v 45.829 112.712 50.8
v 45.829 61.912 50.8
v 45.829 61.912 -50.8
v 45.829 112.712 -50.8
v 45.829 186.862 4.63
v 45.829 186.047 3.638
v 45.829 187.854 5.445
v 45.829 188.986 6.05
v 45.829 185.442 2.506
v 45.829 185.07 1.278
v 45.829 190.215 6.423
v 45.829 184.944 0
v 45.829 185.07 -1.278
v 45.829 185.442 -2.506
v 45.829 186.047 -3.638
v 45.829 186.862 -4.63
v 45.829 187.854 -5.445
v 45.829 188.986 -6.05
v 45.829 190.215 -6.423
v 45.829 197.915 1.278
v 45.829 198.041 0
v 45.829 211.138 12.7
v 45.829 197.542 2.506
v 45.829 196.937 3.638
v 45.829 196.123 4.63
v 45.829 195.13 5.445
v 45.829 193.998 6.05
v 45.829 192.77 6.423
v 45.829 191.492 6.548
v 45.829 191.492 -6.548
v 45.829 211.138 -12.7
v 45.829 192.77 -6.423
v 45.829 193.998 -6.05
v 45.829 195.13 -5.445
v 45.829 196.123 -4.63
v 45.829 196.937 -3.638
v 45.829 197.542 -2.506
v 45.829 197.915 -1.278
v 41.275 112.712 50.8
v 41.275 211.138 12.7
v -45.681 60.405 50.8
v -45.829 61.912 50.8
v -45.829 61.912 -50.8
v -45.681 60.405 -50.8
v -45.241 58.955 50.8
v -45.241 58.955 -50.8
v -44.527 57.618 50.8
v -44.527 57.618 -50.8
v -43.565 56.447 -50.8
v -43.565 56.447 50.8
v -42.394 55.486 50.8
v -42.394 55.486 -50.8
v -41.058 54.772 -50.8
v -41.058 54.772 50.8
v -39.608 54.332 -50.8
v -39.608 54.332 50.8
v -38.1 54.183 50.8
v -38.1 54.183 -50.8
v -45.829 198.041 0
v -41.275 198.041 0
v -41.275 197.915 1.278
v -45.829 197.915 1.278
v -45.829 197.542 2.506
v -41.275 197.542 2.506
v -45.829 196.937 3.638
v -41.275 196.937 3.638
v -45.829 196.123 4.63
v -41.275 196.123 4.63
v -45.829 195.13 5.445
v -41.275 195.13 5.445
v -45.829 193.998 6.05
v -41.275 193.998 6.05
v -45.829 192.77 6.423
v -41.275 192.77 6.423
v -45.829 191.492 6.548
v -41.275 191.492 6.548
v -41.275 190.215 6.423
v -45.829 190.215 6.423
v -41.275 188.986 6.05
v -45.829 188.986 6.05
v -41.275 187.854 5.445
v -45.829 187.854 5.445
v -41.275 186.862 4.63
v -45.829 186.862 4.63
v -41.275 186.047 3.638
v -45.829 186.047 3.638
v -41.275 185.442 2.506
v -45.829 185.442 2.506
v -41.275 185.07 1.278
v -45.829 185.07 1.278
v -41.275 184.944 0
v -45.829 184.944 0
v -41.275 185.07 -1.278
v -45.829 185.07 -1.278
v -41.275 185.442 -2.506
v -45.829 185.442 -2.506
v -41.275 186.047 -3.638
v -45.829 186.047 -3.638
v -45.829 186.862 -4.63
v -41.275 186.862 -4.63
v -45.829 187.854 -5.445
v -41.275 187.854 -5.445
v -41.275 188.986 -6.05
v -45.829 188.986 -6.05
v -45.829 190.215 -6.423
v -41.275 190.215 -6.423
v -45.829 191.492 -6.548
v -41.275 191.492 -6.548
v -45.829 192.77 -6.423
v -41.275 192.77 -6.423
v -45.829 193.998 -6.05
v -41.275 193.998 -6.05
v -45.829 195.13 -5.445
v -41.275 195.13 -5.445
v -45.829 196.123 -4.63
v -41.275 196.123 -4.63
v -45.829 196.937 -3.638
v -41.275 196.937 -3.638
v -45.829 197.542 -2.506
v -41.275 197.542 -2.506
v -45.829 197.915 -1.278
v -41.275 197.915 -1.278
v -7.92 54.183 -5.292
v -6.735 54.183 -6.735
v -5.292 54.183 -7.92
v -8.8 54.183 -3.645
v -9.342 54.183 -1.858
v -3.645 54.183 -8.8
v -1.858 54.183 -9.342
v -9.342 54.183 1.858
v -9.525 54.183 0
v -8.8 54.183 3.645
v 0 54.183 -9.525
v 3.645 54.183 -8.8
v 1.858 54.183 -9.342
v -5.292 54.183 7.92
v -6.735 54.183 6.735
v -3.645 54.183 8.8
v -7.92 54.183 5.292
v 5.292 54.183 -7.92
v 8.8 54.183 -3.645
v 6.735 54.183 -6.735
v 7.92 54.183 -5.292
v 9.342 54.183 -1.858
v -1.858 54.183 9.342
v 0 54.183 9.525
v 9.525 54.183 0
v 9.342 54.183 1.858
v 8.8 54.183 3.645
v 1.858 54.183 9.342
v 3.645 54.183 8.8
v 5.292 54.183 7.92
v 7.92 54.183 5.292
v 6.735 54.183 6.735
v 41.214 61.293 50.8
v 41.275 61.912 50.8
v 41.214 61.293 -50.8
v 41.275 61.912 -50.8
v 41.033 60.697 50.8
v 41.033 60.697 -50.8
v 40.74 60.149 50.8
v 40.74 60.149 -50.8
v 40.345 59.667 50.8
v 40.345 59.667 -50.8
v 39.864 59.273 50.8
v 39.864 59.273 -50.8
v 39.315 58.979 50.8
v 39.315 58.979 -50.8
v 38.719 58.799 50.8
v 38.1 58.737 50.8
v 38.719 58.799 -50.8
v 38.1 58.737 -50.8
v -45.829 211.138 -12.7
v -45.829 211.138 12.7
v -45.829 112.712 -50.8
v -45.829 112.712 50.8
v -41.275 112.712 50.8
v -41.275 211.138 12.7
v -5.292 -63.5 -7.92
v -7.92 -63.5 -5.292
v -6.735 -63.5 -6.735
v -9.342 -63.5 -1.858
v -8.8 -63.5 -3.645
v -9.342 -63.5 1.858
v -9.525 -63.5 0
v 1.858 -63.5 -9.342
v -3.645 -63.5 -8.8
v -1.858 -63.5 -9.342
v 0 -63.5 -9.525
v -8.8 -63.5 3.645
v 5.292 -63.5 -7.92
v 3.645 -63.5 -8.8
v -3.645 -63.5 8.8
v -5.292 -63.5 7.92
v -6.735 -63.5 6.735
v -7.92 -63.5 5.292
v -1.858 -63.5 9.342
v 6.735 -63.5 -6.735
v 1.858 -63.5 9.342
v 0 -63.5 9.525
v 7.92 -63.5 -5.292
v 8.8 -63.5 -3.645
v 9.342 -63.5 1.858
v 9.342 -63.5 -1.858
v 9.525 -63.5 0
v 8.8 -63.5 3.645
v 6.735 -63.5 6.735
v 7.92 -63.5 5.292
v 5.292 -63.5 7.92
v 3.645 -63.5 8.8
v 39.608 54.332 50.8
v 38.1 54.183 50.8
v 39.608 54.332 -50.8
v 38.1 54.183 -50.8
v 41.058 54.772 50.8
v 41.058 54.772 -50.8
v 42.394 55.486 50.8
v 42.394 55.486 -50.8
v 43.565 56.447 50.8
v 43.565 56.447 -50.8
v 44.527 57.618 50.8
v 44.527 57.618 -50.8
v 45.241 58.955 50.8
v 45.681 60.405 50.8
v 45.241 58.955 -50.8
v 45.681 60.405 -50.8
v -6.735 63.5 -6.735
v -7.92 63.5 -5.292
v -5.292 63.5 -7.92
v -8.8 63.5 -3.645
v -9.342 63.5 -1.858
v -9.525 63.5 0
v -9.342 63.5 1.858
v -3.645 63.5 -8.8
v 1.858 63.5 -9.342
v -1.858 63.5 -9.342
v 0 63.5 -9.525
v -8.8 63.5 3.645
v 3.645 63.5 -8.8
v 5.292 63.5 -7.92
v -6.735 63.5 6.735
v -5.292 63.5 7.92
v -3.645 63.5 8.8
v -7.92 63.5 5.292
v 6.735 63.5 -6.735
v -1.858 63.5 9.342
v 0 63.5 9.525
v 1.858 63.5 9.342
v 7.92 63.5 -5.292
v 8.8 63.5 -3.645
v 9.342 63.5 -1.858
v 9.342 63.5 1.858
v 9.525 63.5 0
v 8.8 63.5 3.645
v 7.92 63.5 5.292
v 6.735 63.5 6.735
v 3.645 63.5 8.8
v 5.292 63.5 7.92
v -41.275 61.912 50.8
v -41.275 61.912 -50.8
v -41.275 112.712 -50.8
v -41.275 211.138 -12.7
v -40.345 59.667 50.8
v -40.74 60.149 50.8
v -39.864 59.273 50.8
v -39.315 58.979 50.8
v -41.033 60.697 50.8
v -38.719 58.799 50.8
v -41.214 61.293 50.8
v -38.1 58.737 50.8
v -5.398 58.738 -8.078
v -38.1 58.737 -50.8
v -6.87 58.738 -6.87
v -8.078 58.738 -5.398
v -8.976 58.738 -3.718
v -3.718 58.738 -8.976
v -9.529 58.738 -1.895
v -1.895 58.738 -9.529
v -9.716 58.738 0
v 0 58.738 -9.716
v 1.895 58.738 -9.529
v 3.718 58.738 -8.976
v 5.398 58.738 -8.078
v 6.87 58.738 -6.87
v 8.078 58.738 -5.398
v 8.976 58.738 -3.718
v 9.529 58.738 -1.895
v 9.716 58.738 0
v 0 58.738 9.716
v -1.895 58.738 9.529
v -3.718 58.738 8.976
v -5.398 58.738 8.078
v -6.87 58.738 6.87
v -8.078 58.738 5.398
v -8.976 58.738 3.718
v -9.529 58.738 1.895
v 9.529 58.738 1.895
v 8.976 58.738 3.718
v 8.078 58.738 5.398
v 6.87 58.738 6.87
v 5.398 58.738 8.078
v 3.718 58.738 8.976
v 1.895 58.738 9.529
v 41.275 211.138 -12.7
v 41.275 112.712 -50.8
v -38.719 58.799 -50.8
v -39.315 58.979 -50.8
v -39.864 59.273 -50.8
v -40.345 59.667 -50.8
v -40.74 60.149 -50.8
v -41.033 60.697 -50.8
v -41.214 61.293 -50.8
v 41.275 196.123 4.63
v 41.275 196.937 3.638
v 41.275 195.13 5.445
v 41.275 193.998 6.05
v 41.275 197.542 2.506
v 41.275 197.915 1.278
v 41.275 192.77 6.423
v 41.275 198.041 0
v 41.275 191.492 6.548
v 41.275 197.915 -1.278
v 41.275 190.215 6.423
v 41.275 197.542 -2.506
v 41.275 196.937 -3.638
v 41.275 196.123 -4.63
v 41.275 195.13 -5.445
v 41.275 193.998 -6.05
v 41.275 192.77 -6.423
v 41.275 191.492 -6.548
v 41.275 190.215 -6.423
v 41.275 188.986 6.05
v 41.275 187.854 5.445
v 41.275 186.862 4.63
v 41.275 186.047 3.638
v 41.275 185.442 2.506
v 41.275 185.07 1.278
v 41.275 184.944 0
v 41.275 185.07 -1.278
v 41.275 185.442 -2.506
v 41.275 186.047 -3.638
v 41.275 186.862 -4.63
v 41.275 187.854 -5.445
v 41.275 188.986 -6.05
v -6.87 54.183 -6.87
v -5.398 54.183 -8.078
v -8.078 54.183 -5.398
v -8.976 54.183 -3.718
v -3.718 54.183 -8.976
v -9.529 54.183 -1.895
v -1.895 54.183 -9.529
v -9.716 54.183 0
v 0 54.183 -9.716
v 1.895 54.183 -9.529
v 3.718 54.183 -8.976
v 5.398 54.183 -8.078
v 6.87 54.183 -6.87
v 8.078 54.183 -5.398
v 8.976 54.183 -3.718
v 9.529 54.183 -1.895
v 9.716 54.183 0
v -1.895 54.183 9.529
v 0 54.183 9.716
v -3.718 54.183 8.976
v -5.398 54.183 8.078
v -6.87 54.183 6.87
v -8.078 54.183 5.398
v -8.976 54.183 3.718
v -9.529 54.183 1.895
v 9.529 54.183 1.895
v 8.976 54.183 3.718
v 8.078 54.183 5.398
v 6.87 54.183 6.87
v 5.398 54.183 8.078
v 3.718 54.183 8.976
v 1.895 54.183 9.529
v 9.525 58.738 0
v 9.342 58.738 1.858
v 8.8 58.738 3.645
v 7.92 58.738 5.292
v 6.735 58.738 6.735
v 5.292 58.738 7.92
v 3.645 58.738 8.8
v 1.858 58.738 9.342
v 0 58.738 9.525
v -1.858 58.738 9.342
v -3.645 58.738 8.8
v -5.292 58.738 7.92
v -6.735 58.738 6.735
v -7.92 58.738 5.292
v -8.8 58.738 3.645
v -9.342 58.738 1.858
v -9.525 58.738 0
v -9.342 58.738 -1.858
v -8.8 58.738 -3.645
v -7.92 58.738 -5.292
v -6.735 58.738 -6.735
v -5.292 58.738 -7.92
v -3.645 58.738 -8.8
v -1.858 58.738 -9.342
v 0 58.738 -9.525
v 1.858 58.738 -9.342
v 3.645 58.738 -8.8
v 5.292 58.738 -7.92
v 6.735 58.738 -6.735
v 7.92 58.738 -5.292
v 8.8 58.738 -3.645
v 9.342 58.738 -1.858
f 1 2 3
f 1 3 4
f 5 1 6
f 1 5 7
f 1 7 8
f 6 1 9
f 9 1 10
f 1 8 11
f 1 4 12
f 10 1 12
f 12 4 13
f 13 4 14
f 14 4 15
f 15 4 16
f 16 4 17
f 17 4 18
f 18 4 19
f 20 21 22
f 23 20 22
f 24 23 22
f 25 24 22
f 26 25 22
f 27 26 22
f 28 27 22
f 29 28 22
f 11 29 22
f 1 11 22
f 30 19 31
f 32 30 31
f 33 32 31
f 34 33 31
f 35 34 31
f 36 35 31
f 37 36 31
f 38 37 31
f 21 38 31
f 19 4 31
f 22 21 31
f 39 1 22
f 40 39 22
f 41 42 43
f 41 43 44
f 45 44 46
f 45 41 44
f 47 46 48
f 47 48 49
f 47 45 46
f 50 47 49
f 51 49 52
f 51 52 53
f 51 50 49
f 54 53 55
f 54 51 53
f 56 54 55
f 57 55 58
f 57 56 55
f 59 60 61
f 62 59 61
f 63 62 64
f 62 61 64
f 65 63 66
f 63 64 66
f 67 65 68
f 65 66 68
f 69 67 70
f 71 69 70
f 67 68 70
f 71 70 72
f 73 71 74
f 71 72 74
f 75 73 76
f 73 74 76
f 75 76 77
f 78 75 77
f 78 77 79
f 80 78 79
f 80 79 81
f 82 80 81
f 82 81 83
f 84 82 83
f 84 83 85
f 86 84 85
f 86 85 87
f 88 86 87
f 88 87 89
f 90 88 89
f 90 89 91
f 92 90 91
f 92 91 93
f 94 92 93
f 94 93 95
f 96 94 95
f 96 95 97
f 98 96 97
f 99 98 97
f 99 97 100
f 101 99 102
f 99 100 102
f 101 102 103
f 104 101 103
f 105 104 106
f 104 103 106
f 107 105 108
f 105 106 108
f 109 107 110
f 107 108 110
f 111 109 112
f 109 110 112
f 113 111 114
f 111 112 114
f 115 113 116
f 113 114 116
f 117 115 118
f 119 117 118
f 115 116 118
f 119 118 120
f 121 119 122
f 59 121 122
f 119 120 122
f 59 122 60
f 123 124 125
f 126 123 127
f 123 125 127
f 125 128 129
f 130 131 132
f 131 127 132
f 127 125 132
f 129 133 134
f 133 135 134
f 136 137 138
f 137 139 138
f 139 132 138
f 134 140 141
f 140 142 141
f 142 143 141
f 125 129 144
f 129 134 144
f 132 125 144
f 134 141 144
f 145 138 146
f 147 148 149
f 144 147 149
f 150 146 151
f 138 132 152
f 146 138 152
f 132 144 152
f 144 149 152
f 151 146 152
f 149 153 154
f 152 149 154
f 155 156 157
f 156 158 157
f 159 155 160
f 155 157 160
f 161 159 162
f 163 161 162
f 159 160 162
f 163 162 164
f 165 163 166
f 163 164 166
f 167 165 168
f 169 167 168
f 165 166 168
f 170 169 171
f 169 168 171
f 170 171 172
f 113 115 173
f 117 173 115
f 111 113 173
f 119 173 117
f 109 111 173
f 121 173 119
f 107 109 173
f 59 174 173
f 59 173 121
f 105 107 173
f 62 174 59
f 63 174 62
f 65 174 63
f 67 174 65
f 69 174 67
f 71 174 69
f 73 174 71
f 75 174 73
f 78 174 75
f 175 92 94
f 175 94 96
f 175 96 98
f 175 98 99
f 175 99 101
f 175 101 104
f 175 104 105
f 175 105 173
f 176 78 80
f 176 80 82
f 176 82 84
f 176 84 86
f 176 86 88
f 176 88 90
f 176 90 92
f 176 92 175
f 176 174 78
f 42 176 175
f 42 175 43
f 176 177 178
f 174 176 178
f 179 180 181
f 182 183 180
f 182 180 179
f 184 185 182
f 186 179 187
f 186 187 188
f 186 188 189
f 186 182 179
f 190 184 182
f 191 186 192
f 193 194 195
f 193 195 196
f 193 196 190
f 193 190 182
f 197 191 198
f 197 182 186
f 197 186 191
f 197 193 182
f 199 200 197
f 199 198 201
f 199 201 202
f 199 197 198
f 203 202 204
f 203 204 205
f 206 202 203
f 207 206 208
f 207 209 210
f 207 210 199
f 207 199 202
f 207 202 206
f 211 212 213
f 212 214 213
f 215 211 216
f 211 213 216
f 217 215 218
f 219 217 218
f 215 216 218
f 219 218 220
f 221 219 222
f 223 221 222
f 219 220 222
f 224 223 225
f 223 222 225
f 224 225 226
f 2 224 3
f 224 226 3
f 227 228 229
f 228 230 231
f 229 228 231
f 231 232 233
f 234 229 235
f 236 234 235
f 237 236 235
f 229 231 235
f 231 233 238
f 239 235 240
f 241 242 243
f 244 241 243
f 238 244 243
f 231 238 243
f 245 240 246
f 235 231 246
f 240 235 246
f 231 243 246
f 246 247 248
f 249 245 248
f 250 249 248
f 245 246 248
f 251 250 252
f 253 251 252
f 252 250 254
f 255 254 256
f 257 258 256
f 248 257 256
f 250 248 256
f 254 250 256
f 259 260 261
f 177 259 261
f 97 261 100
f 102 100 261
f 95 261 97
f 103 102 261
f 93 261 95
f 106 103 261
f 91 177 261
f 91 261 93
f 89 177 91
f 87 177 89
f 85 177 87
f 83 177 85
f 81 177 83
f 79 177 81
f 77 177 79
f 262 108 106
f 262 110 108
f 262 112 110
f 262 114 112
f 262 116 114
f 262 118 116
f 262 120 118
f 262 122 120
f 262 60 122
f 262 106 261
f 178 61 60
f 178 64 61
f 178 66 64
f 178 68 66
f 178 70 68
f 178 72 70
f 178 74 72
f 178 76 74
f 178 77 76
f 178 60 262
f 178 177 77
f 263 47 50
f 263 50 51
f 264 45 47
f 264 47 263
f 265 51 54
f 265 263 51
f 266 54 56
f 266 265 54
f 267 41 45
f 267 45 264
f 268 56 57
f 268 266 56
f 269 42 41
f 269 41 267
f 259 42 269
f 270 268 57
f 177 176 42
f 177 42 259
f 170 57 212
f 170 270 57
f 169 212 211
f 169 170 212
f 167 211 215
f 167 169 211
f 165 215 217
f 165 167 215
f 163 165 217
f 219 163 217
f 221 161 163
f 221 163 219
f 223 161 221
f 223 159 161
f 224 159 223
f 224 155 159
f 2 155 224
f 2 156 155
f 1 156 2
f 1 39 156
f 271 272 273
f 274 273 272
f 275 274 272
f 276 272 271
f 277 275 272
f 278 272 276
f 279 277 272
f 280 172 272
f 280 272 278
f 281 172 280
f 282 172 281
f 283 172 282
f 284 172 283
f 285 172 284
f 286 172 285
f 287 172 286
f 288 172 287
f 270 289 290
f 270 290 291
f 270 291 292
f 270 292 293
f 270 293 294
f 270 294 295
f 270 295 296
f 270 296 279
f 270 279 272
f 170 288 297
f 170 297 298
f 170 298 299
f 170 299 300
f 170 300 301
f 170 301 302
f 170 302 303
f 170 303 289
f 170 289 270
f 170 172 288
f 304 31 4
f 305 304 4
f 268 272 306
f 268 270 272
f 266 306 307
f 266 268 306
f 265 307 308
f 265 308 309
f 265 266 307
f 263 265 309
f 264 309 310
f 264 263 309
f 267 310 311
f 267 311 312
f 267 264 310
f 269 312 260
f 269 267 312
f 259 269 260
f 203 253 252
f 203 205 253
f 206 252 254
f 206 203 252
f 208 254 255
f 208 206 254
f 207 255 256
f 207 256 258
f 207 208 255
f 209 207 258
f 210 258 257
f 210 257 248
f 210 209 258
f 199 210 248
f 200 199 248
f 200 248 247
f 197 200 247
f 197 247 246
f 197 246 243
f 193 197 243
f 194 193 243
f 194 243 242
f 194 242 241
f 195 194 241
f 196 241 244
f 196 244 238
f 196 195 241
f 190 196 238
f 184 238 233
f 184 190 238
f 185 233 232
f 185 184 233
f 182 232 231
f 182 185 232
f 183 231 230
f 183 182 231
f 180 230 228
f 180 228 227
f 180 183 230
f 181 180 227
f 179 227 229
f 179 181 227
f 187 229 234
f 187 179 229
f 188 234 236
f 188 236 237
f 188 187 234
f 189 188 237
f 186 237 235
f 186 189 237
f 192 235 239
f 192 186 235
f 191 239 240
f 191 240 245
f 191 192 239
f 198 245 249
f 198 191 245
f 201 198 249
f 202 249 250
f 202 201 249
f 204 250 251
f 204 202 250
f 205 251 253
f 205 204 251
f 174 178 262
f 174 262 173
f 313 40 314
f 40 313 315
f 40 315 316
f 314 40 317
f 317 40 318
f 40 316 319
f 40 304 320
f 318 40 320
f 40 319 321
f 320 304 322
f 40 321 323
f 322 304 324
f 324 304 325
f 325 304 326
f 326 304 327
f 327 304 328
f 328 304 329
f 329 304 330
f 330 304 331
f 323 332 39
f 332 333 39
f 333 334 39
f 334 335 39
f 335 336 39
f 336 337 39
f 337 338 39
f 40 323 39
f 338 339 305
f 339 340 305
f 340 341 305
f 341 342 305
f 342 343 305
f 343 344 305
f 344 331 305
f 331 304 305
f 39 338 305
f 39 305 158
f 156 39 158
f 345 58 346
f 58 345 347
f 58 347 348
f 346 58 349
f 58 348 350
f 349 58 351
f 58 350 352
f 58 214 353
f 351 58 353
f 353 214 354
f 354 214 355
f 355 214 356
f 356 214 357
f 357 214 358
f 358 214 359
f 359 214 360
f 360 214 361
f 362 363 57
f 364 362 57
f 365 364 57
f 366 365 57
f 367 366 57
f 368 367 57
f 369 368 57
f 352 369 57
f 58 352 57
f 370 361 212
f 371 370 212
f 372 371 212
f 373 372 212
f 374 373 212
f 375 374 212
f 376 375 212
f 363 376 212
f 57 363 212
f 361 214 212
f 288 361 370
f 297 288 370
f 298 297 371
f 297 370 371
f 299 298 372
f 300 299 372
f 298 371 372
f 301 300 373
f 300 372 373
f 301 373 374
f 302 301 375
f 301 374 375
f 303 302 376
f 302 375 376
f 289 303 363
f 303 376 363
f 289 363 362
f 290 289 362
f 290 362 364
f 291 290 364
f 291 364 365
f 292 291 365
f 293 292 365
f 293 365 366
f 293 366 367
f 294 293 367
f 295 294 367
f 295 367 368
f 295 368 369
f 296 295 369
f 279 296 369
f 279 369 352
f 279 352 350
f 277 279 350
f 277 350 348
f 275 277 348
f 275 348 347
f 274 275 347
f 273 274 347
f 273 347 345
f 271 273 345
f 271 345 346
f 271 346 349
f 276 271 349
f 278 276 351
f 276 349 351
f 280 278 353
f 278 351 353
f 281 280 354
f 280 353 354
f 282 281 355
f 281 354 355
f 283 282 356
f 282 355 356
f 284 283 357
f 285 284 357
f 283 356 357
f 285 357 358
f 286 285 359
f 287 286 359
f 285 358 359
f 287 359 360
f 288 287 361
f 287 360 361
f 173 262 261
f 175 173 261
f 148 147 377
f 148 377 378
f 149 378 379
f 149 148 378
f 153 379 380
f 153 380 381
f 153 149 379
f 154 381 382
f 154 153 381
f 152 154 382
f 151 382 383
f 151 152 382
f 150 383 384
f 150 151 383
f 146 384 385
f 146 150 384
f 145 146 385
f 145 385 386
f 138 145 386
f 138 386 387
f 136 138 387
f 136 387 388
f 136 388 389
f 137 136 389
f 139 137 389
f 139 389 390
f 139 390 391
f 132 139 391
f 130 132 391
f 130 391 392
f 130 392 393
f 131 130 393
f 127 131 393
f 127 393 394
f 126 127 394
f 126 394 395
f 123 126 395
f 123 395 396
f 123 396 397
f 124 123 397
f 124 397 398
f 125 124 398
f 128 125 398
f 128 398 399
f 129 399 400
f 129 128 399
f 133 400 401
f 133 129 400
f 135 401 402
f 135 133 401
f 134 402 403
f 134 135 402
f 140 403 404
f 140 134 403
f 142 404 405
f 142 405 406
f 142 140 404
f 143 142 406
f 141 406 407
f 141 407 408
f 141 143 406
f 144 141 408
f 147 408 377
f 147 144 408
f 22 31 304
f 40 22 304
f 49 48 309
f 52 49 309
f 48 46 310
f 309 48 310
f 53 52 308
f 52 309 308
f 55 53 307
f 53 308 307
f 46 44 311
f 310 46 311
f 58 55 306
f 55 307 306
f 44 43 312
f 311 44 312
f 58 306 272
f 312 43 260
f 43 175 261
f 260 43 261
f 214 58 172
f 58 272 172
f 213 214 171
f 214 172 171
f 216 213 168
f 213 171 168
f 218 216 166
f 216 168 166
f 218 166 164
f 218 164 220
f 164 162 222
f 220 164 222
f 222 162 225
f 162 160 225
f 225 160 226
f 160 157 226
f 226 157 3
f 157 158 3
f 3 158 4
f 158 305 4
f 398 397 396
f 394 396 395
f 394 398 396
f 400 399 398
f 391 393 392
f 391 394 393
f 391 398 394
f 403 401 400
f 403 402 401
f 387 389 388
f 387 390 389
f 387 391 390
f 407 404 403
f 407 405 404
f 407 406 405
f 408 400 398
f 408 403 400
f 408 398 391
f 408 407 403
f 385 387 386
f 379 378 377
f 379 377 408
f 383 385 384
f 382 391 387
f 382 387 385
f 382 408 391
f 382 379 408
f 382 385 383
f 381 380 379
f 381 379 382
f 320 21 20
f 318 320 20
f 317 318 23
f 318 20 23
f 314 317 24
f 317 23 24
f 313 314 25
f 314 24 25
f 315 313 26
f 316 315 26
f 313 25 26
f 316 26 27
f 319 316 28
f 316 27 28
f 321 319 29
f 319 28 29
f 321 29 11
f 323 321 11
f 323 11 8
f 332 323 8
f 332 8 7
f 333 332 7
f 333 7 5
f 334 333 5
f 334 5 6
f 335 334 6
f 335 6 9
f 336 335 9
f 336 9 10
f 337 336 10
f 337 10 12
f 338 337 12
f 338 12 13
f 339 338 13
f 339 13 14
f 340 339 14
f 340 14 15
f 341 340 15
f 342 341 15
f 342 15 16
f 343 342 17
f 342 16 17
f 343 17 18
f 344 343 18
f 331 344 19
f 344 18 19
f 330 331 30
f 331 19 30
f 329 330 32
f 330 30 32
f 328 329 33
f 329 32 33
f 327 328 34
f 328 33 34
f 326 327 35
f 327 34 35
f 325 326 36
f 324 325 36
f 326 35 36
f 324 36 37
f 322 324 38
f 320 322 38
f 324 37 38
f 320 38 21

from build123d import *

# Parameters (mm, degrees)
F0_R     = 9.525
F1_DEPTH = 63.5
F2_W     = 4.55422
F2_H     = 101.6
F3_DEPTH = 38.1
F5_DEPTH = 50.8
F6_R     = 6.548438
F7_DEPTH = 91.65944
F8_R     = 9.7155
F8_R_2   = 9.525
F9_DEPTH = 156.95522


with BuildPart() as f1:
    # F0 (on Front) → F1 (new body, symmetric)
    with BuildSketch(Plane.XZ):
        Circle(F0_R)
    extrude(amount=F1_DEPTH, both=True)


with BuildPart() as f3:
    # F2 (on Right) → F3 (new body, symmetric)
    with BuildSketch(Plane.YZ):
        with Locations((56.46039, 0)):
            Rectangle(F2_W, F2_H)
    extrude(amount=F3_DEPTH, both=True)

    # F4 (on Top) → F5 (join, symmetric)
    with BuildSketch(Plane.XY):
        with BuildLine():
            Line((41.275, 211.1375), (41.275, 61.9125))
            ThreePointArc((41.275, 61.9125), (40.345064, 59.667436), (38.1, 58.7375))
            Line((38.1, 58.7375), (38.1, 54.18328))
            ThreePointArc((38.1, 54.18328), (43.565384, 56.447116), (45.82922, 61.9125))
            Line((45.82922, 61.9125), (45.82922, 211.1375))
            Line((45.82922, 211.1375), (41.275, 211.1375))
        make_face()
        with BuildLine():
            Line((-41.275, 61.9125), (-41.275, 211.1375))
            Line((-41.275, 211.1375), (-45.82922, 211.1375))
            Line((-45.82922, 211.1375), (-45.82922, 61.9125))
            ThreePointArc((-45.82922, 61.9125), (-43.565384, 56.447116), (-38.1, 54.18328))
            Line((-38.1, 54.18328), (-38.1, 58.7375))
            ThreePointArc((-38.1, 58.7375), (-40.345064, 59.667436), (-41.275, 61.9125))
        make_face()
    extrude(amount=F5_DEPTH, both=True)

    # F6 (on face) → F7 (cut, through all)
    with BuildSketch(Plane.YZ.offset(45.82922)):
        Polygon((211.1375, 12.7), (211.1375, 50.8), (112.7125, 50.8), align=None)
        Polygon((211.1375, -50.8), (211.1375, -12.7), (112.7125, -50.8), align=None)
        with Locations((191.492187, 0)):
            Circle(F6_R)
    extrude(amount=-F7_DEPTH, mode=Mode.SUBTRACT)

    # F8 (on face) → F9 (cut, through all)
    with BuildSketch(Plane.XZ.offset(-54.18328)):
        Circle(F8_R)
        Circle(F8_R_2, mode=Mode.SUBTRACT)
    extrude(amount=-F9_DEPTH, mode=Mode.SUBTRACT)


solid = Compound([f1.part, f3.part])
